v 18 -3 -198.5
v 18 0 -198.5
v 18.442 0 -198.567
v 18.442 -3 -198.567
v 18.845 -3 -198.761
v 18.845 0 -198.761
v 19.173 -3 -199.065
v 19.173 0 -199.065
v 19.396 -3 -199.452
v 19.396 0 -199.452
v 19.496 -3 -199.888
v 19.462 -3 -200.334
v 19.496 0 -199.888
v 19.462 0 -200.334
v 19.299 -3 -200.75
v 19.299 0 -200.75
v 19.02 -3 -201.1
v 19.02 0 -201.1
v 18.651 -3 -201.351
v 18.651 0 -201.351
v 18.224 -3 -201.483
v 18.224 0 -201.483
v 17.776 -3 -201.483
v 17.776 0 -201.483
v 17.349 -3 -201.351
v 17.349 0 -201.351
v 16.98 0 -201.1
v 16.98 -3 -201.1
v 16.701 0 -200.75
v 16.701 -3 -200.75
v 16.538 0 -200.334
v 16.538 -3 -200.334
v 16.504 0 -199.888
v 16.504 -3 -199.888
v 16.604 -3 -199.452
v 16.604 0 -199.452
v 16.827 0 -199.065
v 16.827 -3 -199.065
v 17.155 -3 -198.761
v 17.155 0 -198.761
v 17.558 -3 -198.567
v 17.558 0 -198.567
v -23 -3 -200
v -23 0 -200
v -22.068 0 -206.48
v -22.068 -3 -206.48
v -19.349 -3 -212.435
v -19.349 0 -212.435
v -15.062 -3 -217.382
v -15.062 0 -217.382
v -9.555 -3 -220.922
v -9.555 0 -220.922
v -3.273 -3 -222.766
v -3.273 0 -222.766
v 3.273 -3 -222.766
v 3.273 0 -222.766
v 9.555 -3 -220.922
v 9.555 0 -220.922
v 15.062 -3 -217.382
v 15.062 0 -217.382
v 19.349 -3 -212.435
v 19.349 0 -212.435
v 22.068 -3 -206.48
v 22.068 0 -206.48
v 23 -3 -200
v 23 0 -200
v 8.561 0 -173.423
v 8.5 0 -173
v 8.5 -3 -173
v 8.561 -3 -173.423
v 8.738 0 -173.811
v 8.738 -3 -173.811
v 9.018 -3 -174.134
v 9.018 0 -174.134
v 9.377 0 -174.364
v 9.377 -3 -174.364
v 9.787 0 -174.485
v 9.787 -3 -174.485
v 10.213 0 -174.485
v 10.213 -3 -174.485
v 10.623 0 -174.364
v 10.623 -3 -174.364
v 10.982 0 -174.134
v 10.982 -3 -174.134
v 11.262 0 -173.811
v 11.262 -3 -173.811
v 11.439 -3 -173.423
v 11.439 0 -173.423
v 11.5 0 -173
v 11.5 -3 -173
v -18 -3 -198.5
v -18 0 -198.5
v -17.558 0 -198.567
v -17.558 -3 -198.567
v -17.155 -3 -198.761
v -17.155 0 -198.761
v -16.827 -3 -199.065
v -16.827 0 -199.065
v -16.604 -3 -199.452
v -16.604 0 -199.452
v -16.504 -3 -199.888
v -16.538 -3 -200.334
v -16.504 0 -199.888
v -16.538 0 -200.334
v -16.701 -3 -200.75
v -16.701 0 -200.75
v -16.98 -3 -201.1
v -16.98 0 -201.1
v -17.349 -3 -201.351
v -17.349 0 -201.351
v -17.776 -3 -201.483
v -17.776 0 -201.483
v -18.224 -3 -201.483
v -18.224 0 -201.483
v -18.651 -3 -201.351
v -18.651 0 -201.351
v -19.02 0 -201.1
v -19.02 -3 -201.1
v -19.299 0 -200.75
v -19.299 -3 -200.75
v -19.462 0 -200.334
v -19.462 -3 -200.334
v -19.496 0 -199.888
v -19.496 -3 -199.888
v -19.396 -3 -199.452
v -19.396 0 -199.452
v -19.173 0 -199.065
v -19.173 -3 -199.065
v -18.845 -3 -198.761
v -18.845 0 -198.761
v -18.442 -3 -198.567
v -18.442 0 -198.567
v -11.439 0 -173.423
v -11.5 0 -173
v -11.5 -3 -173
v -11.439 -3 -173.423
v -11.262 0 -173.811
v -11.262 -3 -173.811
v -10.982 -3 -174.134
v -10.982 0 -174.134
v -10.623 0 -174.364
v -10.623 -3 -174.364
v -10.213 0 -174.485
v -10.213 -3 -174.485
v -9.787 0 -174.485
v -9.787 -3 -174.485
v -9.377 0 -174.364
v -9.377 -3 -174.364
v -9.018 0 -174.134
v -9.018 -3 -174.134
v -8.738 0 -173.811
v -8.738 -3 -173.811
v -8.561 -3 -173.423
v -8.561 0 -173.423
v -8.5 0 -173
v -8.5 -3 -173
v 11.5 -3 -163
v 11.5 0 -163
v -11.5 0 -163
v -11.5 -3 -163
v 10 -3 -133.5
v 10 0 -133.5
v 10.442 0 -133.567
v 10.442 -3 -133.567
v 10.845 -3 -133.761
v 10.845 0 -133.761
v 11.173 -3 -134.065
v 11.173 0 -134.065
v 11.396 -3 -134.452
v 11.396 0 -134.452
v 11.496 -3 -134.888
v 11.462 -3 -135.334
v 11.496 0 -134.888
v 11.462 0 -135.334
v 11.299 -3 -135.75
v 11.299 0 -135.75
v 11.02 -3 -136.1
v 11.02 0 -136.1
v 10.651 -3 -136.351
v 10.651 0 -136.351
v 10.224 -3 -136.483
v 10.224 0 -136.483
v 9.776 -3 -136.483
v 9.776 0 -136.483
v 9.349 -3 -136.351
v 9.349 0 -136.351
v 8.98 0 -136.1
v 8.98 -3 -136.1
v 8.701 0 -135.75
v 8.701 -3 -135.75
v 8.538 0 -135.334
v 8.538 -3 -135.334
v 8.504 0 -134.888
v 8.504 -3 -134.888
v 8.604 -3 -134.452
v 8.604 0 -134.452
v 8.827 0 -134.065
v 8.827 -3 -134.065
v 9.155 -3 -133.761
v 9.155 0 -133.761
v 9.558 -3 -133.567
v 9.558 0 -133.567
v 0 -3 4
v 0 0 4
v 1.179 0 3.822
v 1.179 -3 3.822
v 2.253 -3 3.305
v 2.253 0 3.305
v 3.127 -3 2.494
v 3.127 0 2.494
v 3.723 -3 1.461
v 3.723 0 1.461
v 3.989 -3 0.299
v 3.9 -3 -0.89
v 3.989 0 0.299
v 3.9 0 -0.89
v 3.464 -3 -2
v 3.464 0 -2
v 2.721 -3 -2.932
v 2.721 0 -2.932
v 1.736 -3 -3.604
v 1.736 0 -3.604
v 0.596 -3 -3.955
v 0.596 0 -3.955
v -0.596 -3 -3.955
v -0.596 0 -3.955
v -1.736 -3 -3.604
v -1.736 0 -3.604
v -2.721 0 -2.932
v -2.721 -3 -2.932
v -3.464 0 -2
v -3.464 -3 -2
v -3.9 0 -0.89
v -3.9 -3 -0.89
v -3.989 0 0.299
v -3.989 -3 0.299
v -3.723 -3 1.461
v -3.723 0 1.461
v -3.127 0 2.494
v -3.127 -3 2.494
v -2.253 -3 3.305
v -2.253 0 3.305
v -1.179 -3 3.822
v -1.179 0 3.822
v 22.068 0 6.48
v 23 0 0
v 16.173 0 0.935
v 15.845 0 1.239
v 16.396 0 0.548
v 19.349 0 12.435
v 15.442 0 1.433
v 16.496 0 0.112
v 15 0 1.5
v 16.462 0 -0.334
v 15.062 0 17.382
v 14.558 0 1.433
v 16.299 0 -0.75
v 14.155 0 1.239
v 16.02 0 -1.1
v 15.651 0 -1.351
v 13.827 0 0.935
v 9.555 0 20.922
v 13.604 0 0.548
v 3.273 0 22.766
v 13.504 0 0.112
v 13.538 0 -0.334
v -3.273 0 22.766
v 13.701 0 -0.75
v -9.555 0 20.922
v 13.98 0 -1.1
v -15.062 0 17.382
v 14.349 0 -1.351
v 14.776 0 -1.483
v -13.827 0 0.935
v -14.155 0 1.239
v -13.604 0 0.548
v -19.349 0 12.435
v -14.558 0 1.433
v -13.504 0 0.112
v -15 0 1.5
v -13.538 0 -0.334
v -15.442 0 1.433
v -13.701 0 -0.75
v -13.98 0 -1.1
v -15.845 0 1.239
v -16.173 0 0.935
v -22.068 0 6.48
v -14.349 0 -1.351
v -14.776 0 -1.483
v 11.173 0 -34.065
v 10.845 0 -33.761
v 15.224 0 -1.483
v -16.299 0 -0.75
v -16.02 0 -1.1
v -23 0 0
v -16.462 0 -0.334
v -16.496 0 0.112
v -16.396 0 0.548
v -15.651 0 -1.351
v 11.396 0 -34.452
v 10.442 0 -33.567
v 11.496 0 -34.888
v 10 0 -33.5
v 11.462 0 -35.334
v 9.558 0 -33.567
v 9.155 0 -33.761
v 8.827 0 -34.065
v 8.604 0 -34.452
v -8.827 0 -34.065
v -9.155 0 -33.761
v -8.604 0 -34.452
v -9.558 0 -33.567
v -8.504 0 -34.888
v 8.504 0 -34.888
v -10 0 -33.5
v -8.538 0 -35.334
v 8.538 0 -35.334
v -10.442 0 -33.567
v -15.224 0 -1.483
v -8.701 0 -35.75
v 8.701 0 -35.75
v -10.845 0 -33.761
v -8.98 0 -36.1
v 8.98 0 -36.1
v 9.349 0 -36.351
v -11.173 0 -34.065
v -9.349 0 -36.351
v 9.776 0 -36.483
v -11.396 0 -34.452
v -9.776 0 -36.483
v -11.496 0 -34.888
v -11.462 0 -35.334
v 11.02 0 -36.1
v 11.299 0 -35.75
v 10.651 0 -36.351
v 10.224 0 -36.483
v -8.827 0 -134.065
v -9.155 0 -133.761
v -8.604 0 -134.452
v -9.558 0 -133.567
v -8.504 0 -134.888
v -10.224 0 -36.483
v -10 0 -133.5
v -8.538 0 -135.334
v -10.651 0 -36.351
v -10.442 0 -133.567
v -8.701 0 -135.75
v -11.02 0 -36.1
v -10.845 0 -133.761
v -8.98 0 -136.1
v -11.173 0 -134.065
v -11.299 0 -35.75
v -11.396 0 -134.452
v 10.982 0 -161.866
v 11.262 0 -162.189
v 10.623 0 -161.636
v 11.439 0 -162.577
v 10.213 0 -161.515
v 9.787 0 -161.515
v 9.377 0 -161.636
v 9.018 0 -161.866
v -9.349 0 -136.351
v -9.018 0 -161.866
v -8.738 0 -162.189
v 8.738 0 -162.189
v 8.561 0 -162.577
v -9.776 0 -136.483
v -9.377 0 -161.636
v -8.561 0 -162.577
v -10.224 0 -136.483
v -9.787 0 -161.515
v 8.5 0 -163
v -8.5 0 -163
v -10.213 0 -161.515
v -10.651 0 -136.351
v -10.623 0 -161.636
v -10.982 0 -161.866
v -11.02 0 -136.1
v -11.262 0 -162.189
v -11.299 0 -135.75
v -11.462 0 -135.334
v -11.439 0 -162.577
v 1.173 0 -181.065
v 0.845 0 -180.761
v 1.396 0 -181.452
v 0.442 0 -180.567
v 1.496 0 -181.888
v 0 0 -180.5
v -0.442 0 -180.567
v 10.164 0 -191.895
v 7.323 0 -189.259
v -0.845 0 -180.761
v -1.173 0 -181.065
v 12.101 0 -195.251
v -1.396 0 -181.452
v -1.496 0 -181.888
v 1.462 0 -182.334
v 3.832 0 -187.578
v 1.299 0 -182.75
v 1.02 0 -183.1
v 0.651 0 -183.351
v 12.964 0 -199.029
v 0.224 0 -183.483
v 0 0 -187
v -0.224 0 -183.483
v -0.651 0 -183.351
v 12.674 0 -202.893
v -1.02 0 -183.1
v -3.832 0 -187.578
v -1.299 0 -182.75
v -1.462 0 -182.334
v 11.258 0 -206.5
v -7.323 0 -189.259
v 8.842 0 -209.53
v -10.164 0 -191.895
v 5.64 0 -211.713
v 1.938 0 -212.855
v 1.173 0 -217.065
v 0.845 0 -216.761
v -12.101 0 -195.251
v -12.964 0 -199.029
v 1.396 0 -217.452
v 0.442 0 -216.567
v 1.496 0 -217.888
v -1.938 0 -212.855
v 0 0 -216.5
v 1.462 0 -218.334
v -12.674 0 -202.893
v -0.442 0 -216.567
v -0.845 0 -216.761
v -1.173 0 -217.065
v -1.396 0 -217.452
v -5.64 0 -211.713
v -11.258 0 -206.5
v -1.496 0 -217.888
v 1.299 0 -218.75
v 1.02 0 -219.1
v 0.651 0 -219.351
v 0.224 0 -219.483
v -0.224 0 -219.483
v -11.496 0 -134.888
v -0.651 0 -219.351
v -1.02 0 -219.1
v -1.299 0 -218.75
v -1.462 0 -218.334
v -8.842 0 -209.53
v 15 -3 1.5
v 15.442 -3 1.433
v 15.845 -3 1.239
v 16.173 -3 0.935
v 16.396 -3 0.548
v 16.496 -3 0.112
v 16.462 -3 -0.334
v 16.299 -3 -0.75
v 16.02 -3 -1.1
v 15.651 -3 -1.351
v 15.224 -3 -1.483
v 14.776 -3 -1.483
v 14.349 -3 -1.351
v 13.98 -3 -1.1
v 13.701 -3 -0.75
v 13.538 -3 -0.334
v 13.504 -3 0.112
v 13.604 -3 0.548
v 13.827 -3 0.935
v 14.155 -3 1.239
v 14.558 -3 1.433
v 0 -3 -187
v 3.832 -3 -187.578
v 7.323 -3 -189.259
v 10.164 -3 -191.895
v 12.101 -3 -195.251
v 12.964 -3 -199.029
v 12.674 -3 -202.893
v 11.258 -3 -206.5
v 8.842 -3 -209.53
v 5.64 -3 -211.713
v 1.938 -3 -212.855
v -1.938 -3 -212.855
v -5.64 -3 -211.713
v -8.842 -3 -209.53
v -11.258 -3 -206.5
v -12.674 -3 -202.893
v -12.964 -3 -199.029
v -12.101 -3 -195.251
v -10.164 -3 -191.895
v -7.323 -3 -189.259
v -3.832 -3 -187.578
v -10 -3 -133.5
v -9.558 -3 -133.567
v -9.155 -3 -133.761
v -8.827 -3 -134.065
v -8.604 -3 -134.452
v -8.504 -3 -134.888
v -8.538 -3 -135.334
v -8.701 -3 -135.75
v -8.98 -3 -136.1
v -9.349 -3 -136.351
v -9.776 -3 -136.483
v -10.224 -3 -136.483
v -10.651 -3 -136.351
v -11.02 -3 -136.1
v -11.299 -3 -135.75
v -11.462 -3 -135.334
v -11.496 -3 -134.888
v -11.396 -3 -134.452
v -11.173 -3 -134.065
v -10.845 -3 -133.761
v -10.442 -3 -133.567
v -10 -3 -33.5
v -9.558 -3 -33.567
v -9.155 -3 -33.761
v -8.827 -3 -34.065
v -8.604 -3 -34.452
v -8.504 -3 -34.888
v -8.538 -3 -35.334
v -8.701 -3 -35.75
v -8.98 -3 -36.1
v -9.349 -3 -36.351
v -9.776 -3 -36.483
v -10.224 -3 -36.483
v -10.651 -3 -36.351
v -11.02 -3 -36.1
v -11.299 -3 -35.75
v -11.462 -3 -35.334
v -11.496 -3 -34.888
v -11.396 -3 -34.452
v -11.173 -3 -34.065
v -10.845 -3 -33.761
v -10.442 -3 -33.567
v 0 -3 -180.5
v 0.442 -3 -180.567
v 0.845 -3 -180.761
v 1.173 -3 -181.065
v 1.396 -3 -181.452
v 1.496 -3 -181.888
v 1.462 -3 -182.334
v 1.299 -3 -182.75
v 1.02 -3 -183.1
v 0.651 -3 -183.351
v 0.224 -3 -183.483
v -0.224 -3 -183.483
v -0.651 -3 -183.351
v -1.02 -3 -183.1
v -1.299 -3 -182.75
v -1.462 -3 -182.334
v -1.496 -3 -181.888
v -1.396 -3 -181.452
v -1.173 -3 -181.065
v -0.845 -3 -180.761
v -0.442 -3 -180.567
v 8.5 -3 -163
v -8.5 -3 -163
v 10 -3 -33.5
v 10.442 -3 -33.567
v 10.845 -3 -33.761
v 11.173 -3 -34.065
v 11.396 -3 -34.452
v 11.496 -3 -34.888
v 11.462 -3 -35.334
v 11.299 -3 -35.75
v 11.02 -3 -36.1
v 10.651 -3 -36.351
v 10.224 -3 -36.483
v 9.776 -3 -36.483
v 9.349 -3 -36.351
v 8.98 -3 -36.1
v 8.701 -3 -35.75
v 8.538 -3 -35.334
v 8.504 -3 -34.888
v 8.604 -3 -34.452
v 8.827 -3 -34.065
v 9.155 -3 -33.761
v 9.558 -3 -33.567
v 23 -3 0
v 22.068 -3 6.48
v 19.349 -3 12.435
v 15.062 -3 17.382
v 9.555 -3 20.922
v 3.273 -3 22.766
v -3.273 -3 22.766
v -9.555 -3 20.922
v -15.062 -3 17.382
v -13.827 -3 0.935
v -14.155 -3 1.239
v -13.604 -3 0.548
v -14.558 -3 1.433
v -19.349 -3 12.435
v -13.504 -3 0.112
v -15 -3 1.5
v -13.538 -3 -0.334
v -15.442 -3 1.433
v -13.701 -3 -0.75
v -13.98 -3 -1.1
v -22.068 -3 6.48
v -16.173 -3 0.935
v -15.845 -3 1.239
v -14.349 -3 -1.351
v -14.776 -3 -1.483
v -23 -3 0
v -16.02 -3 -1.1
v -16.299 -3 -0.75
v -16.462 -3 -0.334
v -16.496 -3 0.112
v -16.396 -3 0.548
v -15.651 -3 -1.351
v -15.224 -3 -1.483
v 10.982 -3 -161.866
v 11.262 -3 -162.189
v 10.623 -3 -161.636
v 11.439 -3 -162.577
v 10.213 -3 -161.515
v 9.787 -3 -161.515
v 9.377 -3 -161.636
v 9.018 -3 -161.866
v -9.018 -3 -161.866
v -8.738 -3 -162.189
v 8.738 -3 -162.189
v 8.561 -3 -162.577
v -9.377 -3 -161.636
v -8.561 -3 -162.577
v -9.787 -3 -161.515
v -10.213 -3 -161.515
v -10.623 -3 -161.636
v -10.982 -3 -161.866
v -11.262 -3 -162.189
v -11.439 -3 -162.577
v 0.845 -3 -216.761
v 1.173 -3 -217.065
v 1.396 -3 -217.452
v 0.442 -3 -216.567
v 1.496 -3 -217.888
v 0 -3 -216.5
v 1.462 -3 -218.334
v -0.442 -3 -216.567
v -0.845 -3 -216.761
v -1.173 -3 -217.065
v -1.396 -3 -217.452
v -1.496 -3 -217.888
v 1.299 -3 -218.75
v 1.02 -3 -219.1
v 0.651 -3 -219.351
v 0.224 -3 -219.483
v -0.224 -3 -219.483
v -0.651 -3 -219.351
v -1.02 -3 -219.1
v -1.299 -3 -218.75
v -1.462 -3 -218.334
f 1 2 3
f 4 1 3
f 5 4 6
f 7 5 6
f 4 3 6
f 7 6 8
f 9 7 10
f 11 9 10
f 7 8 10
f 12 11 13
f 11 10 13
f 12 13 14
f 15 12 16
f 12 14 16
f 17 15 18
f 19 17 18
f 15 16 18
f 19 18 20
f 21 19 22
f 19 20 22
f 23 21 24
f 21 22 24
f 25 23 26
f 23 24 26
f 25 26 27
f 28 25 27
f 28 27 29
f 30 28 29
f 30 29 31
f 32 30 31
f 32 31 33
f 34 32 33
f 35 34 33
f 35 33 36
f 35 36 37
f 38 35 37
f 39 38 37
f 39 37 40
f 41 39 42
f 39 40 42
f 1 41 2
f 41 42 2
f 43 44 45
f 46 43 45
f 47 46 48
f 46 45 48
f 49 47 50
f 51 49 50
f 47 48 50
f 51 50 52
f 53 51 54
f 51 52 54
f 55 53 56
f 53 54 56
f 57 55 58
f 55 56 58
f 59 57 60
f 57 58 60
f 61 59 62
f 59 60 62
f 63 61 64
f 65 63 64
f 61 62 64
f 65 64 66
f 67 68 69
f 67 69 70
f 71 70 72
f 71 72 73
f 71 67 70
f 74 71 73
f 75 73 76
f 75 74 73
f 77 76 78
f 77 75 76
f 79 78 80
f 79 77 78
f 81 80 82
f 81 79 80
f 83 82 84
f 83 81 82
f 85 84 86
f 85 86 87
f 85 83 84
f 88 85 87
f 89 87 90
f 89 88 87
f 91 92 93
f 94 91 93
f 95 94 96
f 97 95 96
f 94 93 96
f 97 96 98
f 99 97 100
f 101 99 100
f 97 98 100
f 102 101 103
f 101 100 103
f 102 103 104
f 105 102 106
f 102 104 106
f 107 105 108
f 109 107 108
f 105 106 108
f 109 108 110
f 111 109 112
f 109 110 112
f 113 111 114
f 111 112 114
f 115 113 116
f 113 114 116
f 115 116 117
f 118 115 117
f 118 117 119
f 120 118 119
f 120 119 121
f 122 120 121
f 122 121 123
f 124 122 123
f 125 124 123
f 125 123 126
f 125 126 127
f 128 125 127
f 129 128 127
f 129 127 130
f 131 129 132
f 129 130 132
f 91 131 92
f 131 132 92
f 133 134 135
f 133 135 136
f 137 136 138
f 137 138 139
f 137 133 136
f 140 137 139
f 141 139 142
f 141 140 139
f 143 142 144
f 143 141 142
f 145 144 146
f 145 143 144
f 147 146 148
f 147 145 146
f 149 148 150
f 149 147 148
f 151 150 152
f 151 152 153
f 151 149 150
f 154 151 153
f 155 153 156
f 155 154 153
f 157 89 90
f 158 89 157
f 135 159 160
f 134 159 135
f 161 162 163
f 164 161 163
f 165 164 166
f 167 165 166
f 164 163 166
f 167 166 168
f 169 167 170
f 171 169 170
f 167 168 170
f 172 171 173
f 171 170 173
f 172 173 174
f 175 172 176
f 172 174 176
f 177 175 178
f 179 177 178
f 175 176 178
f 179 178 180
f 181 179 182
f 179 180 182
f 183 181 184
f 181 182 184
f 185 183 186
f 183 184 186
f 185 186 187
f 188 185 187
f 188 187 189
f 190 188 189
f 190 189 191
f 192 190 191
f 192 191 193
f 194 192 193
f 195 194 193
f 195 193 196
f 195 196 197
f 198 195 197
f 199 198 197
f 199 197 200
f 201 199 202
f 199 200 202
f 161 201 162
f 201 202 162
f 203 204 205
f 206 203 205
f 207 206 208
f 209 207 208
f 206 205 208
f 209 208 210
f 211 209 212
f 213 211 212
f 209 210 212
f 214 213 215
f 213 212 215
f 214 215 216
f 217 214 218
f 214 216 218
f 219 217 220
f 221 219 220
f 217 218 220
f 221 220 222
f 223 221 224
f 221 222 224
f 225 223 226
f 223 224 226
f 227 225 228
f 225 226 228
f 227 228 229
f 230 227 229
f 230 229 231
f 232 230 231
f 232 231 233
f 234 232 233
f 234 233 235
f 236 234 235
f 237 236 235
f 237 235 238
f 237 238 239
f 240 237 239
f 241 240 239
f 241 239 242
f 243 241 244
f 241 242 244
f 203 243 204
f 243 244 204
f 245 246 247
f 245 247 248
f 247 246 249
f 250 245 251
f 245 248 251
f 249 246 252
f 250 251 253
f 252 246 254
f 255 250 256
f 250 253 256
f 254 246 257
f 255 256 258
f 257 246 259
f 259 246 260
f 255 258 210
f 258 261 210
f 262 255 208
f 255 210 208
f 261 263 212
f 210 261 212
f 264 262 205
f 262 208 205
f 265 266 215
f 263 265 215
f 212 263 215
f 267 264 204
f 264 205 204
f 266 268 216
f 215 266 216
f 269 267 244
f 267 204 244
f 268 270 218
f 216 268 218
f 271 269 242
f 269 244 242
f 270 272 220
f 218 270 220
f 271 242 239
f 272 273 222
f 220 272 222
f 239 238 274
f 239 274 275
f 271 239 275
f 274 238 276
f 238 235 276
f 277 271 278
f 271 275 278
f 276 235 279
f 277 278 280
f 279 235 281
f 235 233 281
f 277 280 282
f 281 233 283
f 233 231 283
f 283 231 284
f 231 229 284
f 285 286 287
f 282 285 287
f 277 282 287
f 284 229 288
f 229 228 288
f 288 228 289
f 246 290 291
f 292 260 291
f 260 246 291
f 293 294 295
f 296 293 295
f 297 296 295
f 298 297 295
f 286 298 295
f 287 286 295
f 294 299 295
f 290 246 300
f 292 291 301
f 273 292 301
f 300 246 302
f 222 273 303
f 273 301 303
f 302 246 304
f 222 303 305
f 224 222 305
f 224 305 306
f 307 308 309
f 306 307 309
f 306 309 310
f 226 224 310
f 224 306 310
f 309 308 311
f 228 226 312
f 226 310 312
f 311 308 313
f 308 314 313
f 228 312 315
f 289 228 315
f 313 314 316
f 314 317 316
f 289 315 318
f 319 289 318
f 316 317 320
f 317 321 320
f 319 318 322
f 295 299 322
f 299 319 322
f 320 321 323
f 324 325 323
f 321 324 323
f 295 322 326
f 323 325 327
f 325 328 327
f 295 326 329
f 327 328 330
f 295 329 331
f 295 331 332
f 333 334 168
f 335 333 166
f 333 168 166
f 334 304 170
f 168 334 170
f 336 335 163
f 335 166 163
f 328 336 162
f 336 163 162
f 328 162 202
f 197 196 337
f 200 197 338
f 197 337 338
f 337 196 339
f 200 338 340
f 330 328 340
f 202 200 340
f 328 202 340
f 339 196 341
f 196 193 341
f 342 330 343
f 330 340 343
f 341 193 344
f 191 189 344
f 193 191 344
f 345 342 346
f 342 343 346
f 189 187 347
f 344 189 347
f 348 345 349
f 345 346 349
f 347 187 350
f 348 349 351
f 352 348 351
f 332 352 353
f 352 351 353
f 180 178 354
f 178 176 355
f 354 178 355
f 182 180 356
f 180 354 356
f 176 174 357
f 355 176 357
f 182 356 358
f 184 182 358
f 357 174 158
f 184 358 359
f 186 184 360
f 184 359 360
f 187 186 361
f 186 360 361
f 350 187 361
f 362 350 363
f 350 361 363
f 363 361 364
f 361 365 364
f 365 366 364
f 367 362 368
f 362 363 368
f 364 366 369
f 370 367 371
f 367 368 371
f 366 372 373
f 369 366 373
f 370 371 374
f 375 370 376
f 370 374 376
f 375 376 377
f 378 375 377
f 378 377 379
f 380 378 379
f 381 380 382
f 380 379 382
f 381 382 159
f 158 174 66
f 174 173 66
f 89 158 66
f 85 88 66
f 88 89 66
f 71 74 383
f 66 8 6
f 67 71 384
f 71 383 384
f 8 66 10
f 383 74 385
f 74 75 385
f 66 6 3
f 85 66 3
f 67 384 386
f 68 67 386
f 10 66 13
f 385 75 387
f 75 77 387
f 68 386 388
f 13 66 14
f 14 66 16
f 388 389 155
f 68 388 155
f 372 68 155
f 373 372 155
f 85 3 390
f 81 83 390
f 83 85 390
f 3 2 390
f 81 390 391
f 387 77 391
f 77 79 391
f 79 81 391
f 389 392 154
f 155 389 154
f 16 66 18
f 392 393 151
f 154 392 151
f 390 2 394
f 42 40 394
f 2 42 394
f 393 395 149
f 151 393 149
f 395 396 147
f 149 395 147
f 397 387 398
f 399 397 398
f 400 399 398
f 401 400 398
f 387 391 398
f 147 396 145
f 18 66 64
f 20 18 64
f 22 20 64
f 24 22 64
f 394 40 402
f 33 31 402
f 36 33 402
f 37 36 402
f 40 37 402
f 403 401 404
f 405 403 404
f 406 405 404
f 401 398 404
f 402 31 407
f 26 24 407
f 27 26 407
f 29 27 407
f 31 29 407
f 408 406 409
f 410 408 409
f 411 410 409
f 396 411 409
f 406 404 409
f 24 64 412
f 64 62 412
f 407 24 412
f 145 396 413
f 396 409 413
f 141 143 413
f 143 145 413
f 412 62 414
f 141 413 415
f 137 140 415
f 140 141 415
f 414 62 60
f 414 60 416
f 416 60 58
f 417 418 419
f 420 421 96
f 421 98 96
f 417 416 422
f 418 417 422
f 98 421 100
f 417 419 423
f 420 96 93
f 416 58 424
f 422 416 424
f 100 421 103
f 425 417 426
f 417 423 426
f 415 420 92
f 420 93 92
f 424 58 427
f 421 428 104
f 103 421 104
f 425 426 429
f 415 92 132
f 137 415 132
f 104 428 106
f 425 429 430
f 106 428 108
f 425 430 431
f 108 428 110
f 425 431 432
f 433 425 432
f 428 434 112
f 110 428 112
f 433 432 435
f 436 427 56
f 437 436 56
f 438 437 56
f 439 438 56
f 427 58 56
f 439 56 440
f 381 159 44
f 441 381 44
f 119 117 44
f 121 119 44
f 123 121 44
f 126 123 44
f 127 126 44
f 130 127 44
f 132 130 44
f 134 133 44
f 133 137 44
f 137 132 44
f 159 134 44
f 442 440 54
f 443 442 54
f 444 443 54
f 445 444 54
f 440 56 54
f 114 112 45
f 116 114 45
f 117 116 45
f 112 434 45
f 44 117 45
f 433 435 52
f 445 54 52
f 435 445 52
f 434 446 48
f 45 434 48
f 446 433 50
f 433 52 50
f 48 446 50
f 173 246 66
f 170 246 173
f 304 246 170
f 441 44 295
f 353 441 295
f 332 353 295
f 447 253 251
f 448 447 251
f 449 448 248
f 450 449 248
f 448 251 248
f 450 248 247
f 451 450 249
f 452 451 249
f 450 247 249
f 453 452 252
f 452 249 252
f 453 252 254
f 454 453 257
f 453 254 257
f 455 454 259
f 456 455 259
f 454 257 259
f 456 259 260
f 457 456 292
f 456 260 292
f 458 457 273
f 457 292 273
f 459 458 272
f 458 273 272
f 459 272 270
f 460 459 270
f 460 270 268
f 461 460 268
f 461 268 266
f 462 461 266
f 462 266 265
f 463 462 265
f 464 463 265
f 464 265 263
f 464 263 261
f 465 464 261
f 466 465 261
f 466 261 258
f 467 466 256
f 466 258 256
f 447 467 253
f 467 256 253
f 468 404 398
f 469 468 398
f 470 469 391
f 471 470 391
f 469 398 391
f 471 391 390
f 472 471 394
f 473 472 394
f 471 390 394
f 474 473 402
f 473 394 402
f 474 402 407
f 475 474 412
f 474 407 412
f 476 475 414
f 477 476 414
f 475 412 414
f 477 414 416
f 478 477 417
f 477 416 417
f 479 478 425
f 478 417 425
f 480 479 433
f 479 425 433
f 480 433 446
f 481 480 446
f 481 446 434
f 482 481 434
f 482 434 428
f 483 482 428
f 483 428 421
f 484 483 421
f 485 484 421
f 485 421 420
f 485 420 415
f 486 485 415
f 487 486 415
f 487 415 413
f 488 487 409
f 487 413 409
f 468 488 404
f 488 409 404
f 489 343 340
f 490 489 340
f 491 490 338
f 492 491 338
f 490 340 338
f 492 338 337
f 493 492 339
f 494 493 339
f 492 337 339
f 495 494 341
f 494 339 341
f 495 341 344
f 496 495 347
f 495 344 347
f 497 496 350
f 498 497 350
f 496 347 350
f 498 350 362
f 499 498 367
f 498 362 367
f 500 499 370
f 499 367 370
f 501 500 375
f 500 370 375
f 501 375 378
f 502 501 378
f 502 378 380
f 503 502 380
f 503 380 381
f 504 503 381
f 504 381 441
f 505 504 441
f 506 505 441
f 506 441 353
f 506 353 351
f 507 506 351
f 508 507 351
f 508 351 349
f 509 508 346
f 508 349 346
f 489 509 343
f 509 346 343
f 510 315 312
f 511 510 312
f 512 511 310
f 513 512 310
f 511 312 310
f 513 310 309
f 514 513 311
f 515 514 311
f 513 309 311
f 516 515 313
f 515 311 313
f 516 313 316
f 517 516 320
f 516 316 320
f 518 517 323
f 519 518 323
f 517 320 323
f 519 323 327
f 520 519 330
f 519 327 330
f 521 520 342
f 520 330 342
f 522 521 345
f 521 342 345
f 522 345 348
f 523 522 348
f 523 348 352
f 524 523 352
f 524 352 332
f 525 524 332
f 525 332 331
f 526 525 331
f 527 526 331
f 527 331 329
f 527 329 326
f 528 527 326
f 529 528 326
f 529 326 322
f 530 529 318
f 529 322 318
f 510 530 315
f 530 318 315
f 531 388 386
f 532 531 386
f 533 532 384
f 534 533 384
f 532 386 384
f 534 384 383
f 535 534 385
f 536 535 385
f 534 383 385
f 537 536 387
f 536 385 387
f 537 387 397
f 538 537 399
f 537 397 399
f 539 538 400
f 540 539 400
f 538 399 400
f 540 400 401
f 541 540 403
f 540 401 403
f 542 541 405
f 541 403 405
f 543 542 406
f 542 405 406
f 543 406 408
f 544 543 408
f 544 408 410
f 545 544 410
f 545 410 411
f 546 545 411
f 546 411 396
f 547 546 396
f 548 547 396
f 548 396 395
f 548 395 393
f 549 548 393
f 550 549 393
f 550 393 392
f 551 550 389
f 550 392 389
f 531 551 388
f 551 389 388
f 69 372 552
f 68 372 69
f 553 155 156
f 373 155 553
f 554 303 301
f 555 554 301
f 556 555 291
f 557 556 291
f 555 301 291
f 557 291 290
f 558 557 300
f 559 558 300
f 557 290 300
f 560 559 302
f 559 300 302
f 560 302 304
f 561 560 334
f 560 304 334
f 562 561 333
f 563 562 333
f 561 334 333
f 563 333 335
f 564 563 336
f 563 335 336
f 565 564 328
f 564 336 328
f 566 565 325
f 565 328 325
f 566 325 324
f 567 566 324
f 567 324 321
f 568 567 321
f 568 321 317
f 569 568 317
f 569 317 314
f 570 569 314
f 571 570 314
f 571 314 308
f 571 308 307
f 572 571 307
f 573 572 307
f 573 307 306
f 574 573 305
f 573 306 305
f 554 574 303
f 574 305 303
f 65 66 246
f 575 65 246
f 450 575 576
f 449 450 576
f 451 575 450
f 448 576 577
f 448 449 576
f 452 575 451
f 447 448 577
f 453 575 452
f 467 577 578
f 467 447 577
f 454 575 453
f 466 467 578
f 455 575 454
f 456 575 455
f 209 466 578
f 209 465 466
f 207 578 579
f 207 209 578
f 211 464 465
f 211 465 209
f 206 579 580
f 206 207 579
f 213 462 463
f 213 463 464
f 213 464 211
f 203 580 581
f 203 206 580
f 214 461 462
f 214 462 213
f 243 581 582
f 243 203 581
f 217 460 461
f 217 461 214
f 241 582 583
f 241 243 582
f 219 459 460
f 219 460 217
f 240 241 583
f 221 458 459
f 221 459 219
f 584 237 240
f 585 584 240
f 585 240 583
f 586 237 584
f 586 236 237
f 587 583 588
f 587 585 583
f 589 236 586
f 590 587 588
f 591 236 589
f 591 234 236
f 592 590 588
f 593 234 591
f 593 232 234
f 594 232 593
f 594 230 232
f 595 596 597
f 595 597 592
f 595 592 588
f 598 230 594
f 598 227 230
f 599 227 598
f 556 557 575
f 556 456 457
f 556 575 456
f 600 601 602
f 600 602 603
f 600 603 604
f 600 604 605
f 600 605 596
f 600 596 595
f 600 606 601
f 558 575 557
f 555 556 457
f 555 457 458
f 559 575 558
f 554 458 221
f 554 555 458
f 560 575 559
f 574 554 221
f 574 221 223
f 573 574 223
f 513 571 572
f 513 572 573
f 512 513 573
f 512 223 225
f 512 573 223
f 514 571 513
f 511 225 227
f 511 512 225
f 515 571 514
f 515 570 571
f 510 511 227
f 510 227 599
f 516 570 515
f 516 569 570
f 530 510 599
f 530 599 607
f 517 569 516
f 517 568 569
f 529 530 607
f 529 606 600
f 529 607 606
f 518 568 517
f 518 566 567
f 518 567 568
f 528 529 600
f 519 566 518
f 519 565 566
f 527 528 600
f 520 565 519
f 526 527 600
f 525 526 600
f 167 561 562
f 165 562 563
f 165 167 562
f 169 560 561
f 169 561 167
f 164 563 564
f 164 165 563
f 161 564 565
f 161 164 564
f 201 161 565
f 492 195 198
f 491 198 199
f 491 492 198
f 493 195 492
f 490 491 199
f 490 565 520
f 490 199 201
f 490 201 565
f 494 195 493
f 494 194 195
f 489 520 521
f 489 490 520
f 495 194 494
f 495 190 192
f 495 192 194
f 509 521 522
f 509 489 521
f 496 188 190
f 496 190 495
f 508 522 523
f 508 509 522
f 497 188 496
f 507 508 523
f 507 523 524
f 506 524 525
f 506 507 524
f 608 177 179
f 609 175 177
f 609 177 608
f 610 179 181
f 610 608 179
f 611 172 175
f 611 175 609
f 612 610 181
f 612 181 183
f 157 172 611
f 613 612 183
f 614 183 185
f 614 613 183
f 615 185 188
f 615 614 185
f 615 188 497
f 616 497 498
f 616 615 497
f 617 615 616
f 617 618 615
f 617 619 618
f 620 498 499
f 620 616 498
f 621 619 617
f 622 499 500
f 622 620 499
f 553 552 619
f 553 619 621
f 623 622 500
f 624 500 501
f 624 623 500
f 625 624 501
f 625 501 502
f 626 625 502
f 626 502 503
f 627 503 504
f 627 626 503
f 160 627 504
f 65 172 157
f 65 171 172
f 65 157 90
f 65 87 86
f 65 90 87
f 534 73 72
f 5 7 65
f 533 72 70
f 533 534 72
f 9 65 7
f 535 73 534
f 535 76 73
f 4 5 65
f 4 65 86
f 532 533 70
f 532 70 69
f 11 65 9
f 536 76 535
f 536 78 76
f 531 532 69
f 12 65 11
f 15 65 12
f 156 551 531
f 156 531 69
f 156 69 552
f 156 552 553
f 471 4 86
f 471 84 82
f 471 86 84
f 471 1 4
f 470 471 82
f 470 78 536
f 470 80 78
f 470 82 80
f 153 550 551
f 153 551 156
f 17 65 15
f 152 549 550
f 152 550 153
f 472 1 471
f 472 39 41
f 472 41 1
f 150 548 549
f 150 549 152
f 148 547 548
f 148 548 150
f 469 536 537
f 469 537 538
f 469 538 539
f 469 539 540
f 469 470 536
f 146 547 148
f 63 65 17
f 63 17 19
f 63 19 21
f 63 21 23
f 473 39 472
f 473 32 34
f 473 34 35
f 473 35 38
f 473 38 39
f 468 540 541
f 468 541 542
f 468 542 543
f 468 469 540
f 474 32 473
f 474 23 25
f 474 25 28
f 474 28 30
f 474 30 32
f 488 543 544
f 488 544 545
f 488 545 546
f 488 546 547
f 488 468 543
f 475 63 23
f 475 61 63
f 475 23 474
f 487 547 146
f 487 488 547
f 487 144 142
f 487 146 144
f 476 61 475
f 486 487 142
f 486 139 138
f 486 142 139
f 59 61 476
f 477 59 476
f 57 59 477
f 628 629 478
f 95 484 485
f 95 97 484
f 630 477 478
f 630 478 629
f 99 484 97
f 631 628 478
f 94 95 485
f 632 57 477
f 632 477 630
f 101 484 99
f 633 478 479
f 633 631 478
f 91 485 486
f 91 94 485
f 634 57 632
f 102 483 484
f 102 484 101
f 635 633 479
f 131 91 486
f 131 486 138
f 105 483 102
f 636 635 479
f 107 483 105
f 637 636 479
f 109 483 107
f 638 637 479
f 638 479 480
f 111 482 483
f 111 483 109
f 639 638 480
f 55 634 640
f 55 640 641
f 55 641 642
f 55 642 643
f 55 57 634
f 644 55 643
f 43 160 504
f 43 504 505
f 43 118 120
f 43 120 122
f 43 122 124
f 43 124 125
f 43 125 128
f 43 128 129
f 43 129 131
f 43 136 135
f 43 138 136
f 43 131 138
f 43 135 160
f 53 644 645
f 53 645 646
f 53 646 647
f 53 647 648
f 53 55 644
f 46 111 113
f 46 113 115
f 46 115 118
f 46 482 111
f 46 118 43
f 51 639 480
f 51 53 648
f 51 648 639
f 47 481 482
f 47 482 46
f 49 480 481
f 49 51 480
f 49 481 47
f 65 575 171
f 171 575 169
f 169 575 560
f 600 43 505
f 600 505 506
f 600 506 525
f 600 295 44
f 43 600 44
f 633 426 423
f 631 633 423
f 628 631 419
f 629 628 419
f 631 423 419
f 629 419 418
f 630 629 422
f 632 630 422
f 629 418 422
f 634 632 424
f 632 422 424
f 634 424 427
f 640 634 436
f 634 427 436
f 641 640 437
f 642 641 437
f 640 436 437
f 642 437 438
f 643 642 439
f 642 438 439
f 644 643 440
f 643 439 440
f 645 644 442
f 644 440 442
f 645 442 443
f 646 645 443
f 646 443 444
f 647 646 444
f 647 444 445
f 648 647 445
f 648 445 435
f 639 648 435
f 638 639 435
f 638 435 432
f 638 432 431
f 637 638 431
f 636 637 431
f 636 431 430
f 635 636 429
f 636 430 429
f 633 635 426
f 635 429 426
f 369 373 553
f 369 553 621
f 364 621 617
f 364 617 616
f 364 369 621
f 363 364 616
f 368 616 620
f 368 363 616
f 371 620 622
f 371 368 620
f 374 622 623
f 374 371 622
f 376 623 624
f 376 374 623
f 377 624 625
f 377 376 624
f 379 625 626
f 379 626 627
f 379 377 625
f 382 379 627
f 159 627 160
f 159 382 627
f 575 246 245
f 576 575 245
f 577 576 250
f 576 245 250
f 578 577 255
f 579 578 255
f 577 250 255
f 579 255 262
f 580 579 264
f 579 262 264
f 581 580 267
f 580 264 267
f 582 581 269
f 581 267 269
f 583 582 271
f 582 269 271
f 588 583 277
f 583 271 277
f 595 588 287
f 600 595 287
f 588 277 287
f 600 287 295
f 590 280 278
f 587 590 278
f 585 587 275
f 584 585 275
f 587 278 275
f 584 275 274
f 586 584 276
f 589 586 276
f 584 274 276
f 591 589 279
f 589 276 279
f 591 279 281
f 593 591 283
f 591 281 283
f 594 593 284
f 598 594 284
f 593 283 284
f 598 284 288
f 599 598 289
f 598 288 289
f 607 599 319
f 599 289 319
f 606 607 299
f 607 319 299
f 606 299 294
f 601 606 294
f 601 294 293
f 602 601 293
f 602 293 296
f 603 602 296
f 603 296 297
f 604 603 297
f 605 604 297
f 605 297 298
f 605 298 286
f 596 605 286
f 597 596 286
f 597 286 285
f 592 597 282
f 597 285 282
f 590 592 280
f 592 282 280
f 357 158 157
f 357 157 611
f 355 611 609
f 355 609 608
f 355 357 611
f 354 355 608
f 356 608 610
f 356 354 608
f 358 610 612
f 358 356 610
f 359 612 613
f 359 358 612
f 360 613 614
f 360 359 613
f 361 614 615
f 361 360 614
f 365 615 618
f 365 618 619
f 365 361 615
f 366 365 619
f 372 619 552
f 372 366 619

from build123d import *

# Parameters (mm, degrees)
SKETCH_1_R             = 4
SKETCH_1_R_2           = 1.5
SKETCH_1_R_3           = 13
SM_BASE_FLANGE_1_DEPTH = 3


# Sheet-metal steps are written as plain solids
with BuildPart() as part:
    # Sketch 1 → 基体-法兰1 (new body)
    with BuildSketch(Plane(origin=(0, 0, 0), x_dir=(1, 0, 0), z_dir=(0, 1, 0))):
        with BuildLine():
            Line((23, 200), (23, 0))
            ThreePointArc((23, 0), (0, -23), (-23, 0))
            Line((-23, 0), (-23, 200))
            ThreePointArc((-23, 200), (0, 223), (23, 200))
        make_face()
        with Locations(Location((0, 0, 0), (0, 0, 270))):
            Circle(SKETCH_1_R, mode=Mode.SUBTRACT)
        with Locations(Location((-10, 35, 0), (0, 0, 270))):
            Circle(SKETCH_1_R_2, mode=Mode.SUBTRACT)
        with Locations(Location((10, 35, 0), (0, 0, 270))):
            Circle(SKETCH_1_R_2, mode=Mode.SUBTRACT)
        with Locations(Location((-10, 135, 0), (0, 0, 270))):
            Circle(SKETCH_1_R_2, mode=Mode.SUBTRACT)
        with Locations(Location((10, 135, 0), (0, 0, 270))):
            Circle(SKETCH_1_R_2, mode=Mode.SUBTRACT)
        with Locations(Location((0, 200, 0), (0, 0, 270))):
            Circle(SKETCH_1_R_3, mode=Mode.SUBTRACT)
        with Locations(Location((15, 0, 0), (0, 0, 270))):
            Circle(SKETCH_1_R_2, mode=Mode.SUBTRACT)
        with Locations(Location((-15, 0, 0), (0, 0, 270))):
            Circle(SKETCH_1_R_2, mode=Mode.SUBTRACT)
        with Locations(Location((0, 218, 0), (0, 0, 270))):
            Circle(SKETCH_1_R_2, mode=Mode.SUBTRACT)
        with Locations(Location((18, 200, 0), (0, 0, 270))):
            Circle(SKETCH_1_R_2, mode=Mode.SUBTRACT)
        with Locations(Location((0, 182, 0), (0, 0, 270))):
            Circle(SKETCH_1_R_2, mode=Mode.SUBTRACT)
        with Locations(Location((-18, 200, 0), (0, 0, 270))):
            Circle(SKETCH_1_R_2, mode=Mode.SUBTRACT)
        with BuildLine():
            Line((-8.5, 173), (-8.5, 163))
            ThreePointArc((-8.5, 163), (-10, 161.5), (-11.5, 163))
            Line((-11.5, 163), (-11.5, 173))
            ThreePointArc((-11.5, 173), (-10, 174.5), (-8.5, 173))
        make_face(mode=Mode.SUBTRACT)
        with BuildLine():
            Line((8.5, 163), (8.5, 173))
            ThreePointArc((8.5, 173), (10, 174.5), (11.5, 173))
            Line((11.5, 173), (11.5, 163))
            ThreePointArc((11.5, 163), (10, 161.5), (8.5, 163))
        make_face(mode=Mode.SUBTRACT)
    extrude(amount=-SM_BASE_FLANGE_1_DEPTH)


solid = part.part
